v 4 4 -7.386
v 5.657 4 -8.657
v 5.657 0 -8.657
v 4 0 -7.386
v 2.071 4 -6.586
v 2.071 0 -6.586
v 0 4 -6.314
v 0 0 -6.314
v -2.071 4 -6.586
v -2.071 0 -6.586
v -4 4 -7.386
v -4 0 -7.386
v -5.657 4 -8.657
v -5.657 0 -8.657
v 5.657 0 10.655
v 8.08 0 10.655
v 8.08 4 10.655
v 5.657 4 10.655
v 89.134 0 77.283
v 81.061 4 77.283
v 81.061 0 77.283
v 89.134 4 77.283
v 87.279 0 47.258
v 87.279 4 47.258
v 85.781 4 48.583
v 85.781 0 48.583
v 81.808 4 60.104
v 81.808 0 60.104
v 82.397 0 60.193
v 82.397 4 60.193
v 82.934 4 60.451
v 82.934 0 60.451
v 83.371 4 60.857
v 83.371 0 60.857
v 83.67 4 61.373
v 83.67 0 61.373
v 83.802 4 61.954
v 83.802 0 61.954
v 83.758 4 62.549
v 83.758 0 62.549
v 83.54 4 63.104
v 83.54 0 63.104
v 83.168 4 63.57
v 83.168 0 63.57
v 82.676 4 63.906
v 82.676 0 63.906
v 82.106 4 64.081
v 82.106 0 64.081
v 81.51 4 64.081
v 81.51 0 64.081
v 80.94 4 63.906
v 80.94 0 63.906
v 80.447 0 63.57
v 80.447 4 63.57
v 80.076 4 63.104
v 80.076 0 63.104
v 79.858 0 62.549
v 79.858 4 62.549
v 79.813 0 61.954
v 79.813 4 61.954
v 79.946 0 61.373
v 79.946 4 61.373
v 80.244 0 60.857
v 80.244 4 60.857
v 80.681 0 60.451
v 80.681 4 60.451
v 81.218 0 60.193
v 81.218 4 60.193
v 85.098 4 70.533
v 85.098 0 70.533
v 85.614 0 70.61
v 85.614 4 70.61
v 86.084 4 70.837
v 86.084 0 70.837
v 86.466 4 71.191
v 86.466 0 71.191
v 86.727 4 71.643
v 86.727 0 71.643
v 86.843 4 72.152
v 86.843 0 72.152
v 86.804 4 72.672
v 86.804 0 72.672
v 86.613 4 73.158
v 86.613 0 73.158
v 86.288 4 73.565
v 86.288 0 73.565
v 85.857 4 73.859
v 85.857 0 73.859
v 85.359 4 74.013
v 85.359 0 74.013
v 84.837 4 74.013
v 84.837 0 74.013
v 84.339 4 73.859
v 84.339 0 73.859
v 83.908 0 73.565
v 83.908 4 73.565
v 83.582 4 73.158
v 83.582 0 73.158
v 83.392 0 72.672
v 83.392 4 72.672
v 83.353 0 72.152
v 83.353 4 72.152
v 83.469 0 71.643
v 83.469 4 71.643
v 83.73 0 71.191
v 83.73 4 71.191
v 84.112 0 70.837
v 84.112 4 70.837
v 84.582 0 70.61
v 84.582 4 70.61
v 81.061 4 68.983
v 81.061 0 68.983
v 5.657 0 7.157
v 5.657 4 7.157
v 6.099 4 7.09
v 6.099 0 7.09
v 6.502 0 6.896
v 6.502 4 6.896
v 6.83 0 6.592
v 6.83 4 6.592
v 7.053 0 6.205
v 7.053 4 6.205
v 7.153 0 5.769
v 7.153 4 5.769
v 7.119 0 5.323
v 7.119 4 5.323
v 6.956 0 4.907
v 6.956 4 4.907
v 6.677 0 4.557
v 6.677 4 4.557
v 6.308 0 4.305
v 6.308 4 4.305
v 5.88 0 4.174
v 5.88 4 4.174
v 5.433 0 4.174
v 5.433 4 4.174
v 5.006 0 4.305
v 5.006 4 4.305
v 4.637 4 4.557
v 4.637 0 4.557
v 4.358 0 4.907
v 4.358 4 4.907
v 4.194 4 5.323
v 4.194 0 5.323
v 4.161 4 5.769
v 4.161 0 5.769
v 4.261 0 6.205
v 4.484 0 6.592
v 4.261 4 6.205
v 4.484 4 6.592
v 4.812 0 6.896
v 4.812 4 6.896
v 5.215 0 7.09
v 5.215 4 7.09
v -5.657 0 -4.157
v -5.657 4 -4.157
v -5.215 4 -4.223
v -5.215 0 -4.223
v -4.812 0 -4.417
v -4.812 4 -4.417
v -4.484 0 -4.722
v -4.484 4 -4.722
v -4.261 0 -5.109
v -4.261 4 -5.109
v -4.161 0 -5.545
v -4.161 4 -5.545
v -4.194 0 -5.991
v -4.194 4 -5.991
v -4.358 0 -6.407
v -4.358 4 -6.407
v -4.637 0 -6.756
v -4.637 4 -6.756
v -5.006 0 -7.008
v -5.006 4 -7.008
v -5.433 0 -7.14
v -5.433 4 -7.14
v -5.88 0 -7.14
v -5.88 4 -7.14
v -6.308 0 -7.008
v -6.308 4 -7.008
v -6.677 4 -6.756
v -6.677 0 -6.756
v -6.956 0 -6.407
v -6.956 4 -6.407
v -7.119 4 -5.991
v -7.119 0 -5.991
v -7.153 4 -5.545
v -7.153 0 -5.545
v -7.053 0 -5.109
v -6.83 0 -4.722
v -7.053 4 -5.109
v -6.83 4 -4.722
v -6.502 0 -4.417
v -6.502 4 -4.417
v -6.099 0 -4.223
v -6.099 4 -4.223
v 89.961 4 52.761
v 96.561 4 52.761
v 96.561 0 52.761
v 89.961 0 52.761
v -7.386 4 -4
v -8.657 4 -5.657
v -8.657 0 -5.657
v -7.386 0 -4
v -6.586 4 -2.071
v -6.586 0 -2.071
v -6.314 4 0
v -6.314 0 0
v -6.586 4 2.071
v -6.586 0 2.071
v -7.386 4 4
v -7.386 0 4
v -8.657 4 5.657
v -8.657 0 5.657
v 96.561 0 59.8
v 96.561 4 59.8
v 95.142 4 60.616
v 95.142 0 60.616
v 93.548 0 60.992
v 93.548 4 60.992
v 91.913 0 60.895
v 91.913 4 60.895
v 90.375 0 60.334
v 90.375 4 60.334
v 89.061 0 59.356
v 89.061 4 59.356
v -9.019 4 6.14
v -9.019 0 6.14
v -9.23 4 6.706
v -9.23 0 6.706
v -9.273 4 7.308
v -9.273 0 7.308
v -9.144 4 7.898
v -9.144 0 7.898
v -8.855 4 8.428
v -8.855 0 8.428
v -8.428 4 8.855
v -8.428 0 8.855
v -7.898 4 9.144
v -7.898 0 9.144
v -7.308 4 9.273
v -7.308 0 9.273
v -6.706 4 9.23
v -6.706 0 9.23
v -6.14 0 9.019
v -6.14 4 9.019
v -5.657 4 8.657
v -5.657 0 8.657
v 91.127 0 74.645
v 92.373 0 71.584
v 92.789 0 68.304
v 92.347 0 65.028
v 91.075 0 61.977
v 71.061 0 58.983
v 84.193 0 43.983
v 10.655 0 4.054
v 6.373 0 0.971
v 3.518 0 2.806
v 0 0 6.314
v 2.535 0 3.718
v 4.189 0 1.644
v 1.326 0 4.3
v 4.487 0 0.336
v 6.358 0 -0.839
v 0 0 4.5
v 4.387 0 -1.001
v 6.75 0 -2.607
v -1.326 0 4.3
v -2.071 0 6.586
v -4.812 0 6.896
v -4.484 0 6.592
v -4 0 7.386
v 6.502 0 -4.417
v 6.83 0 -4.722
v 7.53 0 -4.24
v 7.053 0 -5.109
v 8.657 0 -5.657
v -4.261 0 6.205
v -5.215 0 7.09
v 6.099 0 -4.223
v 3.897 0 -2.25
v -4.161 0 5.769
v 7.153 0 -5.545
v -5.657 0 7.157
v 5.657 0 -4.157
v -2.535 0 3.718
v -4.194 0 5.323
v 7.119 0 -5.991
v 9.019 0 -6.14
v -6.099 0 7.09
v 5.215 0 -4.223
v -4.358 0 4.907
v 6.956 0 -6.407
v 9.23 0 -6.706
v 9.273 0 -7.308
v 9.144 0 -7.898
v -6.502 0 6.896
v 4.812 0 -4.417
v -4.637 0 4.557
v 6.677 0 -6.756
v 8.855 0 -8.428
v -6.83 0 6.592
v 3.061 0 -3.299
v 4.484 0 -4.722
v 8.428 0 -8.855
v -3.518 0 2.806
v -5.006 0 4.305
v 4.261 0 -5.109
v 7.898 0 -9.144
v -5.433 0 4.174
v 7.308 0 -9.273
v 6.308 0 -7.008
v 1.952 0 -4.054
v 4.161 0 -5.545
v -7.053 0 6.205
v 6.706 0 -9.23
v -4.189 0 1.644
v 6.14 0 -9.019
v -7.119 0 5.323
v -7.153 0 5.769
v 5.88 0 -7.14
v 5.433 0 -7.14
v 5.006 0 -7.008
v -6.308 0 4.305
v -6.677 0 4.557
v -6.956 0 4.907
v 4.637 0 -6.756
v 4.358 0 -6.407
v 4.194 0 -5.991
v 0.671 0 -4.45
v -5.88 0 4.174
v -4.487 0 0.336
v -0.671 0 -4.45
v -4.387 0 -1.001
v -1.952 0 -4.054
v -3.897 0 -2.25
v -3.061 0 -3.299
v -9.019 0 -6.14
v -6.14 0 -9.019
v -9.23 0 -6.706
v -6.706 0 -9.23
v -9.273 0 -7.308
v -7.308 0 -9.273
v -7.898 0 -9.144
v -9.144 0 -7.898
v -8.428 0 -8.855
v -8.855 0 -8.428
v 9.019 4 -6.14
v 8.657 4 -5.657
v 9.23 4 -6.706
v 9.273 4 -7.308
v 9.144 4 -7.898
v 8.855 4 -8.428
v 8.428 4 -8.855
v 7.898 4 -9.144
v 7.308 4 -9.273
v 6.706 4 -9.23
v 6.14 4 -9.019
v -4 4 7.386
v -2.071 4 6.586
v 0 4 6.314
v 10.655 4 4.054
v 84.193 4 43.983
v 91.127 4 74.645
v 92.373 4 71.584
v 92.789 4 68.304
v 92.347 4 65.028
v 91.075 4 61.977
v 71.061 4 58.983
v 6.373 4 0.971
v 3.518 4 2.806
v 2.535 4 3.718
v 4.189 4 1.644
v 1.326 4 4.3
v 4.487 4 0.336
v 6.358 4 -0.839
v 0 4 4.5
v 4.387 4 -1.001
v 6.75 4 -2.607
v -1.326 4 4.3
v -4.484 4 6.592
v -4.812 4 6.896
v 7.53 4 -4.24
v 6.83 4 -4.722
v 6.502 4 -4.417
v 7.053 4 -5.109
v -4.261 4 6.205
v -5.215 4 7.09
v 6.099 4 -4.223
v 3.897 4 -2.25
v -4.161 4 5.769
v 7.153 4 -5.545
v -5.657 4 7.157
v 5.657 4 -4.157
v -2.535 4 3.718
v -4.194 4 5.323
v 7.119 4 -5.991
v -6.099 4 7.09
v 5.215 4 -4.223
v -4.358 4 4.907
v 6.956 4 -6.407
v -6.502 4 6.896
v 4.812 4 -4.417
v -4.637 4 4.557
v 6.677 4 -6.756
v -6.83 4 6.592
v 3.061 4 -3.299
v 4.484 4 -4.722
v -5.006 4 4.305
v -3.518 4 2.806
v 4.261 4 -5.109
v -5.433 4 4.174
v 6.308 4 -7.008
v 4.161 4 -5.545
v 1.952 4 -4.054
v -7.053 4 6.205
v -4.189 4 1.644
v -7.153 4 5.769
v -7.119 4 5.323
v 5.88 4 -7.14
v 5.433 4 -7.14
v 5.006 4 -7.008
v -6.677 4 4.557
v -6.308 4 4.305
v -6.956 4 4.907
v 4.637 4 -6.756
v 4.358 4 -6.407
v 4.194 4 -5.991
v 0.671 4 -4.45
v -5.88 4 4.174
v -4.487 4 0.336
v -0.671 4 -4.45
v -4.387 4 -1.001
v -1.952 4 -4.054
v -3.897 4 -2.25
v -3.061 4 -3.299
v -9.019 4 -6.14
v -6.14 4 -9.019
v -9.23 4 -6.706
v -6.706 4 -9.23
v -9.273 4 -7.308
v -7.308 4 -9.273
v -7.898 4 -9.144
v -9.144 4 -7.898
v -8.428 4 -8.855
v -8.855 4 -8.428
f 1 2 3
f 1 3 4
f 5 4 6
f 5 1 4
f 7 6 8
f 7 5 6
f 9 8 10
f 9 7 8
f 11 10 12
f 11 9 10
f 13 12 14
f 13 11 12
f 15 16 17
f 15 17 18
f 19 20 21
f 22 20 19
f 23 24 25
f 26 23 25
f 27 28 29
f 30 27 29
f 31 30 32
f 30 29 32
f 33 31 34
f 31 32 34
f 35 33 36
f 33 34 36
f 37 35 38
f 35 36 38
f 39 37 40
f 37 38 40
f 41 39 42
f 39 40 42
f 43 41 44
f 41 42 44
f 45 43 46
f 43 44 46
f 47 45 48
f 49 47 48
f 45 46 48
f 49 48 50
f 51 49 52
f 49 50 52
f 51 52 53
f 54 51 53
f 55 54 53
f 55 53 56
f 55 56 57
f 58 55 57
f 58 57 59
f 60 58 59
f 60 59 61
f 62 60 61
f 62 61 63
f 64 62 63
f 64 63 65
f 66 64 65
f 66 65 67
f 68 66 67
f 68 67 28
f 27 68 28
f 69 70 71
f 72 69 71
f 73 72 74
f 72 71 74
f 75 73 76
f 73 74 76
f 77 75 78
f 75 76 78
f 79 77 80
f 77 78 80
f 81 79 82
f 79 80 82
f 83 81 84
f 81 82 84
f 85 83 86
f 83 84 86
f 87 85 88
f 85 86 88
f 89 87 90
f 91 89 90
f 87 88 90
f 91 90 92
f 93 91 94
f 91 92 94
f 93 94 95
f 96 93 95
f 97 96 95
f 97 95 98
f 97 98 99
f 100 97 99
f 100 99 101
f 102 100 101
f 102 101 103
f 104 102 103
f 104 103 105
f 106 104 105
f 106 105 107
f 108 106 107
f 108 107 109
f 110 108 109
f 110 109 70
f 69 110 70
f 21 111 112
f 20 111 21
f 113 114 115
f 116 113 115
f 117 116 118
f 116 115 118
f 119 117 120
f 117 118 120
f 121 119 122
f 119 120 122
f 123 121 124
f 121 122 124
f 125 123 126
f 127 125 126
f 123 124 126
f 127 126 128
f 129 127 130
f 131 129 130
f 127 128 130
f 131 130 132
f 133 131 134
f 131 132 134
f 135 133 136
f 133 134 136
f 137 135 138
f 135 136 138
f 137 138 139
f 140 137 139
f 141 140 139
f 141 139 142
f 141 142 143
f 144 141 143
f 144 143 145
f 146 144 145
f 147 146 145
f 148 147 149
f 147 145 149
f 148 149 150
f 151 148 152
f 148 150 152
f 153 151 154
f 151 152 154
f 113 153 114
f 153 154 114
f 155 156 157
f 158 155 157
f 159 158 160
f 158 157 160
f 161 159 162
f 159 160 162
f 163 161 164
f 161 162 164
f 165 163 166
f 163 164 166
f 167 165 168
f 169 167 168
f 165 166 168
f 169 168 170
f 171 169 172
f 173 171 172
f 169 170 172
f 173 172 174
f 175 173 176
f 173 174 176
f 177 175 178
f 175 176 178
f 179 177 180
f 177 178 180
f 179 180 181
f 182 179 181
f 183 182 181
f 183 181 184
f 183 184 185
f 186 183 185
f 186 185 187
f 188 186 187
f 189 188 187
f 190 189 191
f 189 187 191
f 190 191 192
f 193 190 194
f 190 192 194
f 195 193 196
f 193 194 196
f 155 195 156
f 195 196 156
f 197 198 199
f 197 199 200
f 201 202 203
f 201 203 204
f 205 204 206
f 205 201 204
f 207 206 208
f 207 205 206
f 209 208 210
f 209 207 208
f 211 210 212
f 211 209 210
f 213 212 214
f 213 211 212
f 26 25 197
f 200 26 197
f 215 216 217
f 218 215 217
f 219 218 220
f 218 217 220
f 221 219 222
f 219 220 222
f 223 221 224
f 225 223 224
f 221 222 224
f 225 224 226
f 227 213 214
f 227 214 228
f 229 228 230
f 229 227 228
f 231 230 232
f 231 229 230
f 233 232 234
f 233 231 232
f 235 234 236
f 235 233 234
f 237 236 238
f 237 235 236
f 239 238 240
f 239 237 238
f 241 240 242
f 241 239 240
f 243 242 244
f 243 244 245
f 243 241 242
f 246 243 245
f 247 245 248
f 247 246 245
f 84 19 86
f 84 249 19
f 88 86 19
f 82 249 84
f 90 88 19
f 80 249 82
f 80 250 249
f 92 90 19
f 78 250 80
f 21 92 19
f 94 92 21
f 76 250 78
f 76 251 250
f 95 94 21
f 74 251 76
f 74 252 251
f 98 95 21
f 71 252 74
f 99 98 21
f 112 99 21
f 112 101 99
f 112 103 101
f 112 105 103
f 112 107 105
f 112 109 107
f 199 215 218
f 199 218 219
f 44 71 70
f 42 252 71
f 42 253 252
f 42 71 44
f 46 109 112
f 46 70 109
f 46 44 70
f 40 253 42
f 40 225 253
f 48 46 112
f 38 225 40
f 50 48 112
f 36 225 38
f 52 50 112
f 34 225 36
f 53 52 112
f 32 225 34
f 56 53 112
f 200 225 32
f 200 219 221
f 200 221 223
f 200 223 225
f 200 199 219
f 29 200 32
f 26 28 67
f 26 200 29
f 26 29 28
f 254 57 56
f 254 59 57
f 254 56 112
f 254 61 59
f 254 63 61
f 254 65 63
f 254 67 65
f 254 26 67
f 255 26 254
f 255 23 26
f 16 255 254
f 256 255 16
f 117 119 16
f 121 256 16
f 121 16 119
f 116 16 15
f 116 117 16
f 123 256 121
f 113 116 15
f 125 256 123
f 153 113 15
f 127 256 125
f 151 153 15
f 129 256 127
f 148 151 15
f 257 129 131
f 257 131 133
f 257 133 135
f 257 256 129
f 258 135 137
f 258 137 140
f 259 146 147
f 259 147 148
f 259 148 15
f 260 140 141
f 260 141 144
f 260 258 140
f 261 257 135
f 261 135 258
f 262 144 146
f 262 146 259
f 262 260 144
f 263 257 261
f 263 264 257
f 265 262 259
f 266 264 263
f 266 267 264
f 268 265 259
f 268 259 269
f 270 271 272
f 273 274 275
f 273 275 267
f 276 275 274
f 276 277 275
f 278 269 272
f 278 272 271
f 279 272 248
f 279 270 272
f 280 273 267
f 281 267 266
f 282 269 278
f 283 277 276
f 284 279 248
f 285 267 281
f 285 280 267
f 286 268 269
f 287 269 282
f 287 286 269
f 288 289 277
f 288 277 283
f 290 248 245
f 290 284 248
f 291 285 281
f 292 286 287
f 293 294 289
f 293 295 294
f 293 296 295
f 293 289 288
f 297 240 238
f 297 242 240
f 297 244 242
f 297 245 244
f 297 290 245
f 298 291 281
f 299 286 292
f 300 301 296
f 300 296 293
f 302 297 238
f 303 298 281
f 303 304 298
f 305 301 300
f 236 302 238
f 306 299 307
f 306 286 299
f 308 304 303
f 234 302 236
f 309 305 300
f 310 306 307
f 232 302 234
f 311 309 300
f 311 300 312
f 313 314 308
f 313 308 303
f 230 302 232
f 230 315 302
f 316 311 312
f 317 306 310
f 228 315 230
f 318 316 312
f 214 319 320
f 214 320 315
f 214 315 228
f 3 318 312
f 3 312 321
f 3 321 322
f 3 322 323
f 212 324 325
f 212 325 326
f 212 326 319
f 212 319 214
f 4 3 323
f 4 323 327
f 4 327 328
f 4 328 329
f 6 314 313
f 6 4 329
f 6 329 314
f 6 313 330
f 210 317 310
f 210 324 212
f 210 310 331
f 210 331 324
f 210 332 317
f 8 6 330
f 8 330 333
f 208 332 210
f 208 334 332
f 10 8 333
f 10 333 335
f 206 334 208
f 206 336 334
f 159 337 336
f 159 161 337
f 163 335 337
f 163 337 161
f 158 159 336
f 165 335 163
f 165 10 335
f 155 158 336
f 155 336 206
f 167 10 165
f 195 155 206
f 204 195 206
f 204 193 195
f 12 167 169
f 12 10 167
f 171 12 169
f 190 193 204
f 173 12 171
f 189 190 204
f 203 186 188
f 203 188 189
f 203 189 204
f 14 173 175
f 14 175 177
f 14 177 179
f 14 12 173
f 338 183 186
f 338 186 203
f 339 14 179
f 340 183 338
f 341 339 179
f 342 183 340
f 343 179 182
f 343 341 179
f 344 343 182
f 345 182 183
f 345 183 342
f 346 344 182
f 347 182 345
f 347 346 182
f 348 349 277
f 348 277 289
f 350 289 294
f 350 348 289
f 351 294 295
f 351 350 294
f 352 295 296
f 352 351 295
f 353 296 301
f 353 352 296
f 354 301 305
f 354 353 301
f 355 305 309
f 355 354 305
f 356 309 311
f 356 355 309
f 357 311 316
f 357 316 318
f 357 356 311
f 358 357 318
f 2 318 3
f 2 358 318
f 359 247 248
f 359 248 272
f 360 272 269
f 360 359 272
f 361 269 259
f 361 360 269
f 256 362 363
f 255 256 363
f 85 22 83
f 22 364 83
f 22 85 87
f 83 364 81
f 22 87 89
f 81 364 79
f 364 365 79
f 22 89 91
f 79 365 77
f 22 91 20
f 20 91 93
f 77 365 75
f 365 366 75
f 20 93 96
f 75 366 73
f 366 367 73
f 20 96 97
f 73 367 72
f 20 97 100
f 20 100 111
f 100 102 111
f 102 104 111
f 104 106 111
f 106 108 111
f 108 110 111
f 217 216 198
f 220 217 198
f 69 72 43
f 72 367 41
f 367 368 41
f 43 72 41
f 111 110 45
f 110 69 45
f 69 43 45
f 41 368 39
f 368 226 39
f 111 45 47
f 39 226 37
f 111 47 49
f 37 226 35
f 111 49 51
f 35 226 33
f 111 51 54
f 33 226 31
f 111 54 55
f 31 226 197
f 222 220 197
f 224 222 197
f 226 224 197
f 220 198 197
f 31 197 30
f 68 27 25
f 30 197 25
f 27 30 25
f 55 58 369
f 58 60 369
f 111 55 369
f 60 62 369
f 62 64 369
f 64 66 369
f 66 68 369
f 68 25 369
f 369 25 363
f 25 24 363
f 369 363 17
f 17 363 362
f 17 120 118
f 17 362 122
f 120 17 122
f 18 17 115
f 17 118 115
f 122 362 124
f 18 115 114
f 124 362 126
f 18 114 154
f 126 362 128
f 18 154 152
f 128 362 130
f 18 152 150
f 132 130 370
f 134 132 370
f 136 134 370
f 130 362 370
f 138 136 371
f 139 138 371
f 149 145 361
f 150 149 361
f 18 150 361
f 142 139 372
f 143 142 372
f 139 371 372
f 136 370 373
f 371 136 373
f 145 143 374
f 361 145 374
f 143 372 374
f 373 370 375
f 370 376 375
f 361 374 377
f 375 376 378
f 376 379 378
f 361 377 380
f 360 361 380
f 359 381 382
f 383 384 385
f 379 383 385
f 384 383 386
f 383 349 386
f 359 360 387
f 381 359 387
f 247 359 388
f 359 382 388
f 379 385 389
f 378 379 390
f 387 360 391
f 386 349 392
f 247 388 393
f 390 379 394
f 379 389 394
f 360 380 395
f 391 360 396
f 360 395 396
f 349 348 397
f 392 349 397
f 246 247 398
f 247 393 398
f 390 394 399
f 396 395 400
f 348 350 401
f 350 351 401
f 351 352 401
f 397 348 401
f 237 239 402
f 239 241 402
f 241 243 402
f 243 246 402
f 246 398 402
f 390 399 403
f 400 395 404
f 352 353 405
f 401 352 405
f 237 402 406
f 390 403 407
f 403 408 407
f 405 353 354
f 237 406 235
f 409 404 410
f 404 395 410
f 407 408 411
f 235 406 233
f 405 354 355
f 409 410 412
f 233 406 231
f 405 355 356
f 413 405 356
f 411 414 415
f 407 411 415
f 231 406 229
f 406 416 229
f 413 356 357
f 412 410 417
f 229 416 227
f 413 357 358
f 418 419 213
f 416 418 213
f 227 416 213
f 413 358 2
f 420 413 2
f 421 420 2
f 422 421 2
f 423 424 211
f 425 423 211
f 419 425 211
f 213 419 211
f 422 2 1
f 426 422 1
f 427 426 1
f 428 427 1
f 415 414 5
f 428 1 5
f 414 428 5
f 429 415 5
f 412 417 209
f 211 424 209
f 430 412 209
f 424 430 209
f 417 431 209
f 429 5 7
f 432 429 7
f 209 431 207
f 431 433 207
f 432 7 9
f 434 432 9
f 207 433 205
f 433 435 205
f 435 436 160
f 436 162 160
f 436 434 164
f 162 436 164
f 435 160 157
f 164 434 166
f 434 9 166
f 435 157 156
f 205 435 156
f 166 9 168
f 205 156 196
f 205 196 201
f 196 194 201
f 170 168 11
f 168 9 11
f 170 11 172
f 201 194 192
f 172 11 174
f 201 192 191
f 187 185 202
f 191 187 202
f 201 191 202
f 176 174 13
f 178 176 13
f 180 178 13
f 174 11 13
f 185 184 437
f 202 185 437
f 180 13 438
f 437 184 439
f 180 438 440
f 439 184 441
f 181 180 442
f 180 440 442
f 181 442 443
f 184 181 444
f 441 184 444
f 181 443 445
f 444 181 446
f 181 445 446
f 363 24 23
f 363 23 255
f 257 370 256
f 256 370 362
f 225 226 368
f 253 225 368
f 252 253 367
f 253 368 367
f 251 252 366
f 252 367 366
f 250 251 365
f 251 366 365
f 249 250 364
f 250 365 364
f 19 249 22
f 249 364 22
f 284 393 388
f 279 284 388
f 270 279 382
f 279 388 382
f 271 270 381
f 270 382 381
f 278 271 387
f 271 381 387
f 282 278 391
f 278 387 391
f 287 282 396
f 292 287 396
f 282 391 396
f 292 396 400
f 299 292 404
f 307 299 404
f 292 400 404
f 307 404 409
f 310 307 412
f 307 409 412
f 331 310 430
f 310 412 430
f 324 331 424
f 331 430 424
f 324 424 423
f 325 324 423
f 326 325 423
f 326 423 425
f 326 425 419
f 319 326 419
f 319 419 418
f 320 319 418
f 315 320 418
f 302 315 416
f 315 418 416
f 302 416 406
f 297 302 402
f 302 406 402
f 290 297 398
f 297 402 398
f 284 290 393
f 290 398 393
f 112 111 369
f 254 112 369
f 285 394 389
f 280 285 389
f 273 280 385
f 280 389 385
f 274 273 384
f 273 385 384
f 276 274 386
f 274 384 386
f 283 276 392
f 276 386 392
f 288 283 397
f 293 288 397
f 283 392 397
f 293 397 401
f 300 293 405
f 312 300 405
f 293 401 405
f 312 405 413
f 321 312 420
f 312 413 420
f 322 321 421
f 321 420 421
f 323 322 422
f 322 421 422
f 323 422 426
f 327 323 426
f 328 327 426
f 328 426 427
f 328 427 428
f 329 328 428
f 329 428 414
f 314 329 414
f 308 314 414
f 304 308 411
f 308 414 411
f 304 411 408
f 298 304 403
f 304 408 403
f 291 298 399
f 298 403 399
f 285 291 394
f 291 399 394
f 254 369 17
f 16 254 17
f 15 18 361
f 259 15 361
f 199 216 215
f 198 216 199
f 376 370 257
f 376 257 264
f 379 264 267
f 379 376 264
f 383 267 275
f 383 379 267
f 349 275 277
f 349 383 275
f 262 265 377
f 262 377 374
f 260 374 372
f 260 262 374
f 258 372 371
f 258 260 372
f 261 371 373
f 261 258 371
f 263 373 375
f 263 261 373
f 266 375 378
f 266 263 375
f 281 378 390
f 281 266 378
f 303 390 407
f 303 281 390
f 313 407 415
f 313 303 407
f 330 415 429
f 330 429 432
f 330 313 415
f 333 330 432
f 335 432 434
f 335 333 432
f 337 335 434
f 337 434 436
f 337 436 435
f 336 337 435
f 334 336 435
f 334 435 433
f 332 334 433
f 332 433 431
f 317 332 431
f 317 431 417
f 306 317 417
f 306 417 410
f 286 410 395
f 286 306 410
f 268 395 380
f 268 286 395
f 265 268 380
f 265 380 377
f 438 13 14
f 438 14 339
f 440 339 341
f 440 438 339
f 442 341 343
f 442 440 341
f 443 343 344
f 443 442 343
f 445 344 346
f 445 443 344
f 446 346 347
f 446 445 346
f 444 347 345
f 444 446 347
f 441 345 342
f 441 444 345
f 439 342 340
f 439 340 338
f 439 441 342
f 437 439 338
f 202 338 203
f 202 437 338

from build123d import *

# Parameters (mm, degrees)
SKETCH1_W            = 16.31
SKETCH1_H            = 16.31
SKETCH1_R            = 4.5
BOSS_EXTRUDE1_DEPTH  = 4
SKETCH3_R            = 1.5
CUT_EXTRUDE1_DEPTH   = 4
BOSS_EXTRUDE2_DEPTH  = 4
BOSS_EXTRUDE6_DEPTH  = 4
CUT_EXTRUDE3_DEPTH   = 4
BOSS_EXTRUDE7_DEPTH  = 4
BOSS_EXTRUDE9_DEPTH  = 4
SKETCH17_OUTSIDE_W   = 136.165
SKETCH17_OUTSIDE_H   = 117.232
CUT_EXTRUDE4_DEPTH   = 4
SKETCH18_R           = 1.5
BOSS_EXTRUDE10_DEPTH = 4
CUT_EXTRUDE5_DEPTH   = 4
SKETCH20_R           = 2
CUT_EXTRUDE6_DEPTH   = 10
SKETCH22_R           = 1.75
CUT_EXTRUDE8_DEPTH   = 124.744497459


with BuildPart() as part:
    # Sketch1 → Boss-Extrude1 (new body)
    with BuildSketch(Plane(origin=(0, 0, 0), x_dir=(1, 0, 0), z_dir=(0, 1, 0))):
        Rectangle(SKETCH1_W, SKETCH1_H)
        with Locations(Location((0, 0, 0), (0, 0, 270))):
            Circle(SKETCH1_R, mode=Mode.SUBTRACT)
    extrude(amount=BOSS_EXTRUDE1_DEPTH)

    # Sketch3 → Cut-Extrude1 (cut)
    with BuildSketch(Plane(origin=(0, 4, 0), x_dir=(1, 0, 0), z_dir=(0, 1, 0))):
        with Locations(Location((5.656854249, 5.656854249, 0), (0, 0, 270))):
            Circle(SKETCH3_R)
        with Locations(Location((5.656854249, -5.656854249, 0), (0, 0, 270))):
            Circle(SKETCH3_R)
        with Locations(Location((-5.656854249, -5.656854249, 0), (0, 0, 270))):
            Circle(SKETCH3_R)
        with Locations(Location((-5.656854249, 5.656854249, 0), (0, 0, 270))):
            Circle(SKETCH3_R)
    extrude(amount=-CUT_EXTRUDE1_DEPTH, mode=Mode.SUBTRACT)

    # Sketch4 → Boss-Extrude2 (add)
    with BuildSketch(Plane(origin=(0, 4, 0), x_dir=(1, 0, 0), z_dir=(0, 1, 0))):
        Polygon((8.155, -8.155), (0, -8.155), (0, -10.655), (10.655, -10.655), (10.655, 0), (8.155, 0), align=None)
    extrude(amount=-BOSS_EXTRUDE2_DEPTH)

    # Sketch9 → Boss-Extrude6 (add)
    with BuildSketch(Plane(origin=(0, 4, 0), x_dir=(1, 0, 0), z_dir=(0, 1, 0))):
        Polygon((71.061407011, -58.982568069), (7.593139788, -10.281653748), (10.613791504, -4.032054751), (84.193483815, -43.982568069), (90.501950314, -50.291034568), (96.061407011, -50.291034568), (96.061407011, -73.982568069), (81.061407011, -73.982568069), (81.061407011, -68.982568069), align=None)
    extrude(amount=-BOSS_EXTRUDE6_DEPTH)

    # Sketch12 → Cut-Extrude3 (cut)
    with BuildSketch(Plane(origin=(0, 4, 0), x_dir=(1, 0, 0), z_dir=(0, 1, 0))):
        Polygon((87.278639473, -47.258318902), (85.780514725, -48.583317861), (89.960889469, -52.761034568), (90.501950314, -52.761034568), (96.061407011, -52.761034568), (96.061407011, -50.291034568), (90.501950314, -50.291034568), (87.347717064, -47.136801318), align=None)
    extrude(amount=-CUT_EXTRUDE3_DEPTH, mode=Mode.SUBTRACT)

    # Sketch13 → Boss-Extrude7 (add)
    with BuildSketch(Plane(origin=(0, 4, 0), x_dir=(1, 0, 0), z_dir=(0, 1, 0))):
        Polygon((81.061407011, -73.982568069), (81.061407011, -77.282568069), (96.561407011, -77.282568069), (96.561407011, -52.761034568), (96.061407011, -52.761034568), (96.061407011, -73.982568069), align=None)
    extrude(amount=-BOSS_EXTRUDE7_DEPTH)

    # Sketch16 → Boss-Extrude9 (add)
    with BuildSketch(Plane(origin=(0, 4, 0), x_dir=(1, 0, 0), z_dir=(0, 1, 0))):
        Polygon((0, -10.655), (-10, -10.655), (-10, 10.345), (10.655, 10.345), (10.655, 0), (8.155, 0), (8.155, 8.155), (-8.155, 8.155), (-8.155, -8.155), (0, -8.155), align=None)
    extrude(amount=-BOSS_EXTRUDE9_DEPTH)

    # Sketch17 outside → Cut-Extrude4 (cut)
    with BuildSketch(Plane(origin=(0, 4, 0), x_dir=(1, 0, 0), z_dir=(0, 1, 0))):
        with Locations((43.2805, -33.469)):
            Rectangle(SKETCH17_OUTSIDE_W, SKETCH17_OUTSIDE_H)
        with BuildLine():
            Line((5.656854249, -8.656854249), (5.656854249, -10.655))
            Line((5.656854249, -10.655), (8.079694096, -10.655))
            Line((8.079694096, -10.655), (71.061407011, -58.982568069))
            Line((71.061407011, -58.982568069), (81.061407011, -68.982568069))
            Line((81.061407011, -68.982568069), (81.061407011, -77.282568069))
            Line((81.061407011, -77.282568069), (96.561407011, -77.282568069))
            Line((96.561407011, -77.282568069), (96.561407011, -52.761034568))
            Line((96.561407011, -52.761034568), (89.960889469, -52.761034568))
            Line((89.960889469, -52.761034568), (85.780514725, -48.583317861))
            Line((85.780514725, -48.583317861), (87.278639473, -47.258318902))
            Line((87.278639473, -47.258318902), (84.193483815, -43.982568069))
            Line((84.193483815, -43.982568069), (10.655, -4.054429139))
            Line((10.655, -4.054429139), (8.656854249, -5.656854249))
            ThreePointArc((8.656854249, -5.656854249), (6.313708499, 0), (8.656854249, 5.656854249))
            ThreePointArc((8.656854249, 5.656854249), (8.656854249, 8.656854249), (5.656854249, 8.656854249))
            ThreePointArc((5.656854249, 8.656854249), (0, 6.313708499), (-5.656854249, 8.656854249))
            ThreePointArc((-5.656854249, 8.656854249), (-8.656854249, 8.656854249), (-8.656854249, 5.656854249))
            ThreePointArc((-8.656854249, 5.656854249), (-6.313708499, 0), (-8.656854249, -5.656854249))
            ThreePointArc((-8.656854249, -5.656854249), (-8.656854249, -8.656854249), (-5.656854249, -8.656854249))
            ThreePointArc((-5.656854249, -8.656854249), (0, -6.313708499), (5.656854249, -8.656854249))
        make_face(mode=Mode.SUBTRACT)
    extrude(amount=-CUT_EXTRUDE4_DEPTH, mode=Mode.SUBTRACT)

    # Sketch18 → Boss-Extrude10 (add)
    with BuildSketch(Plane(origin=(0, 4, 0), x_dir=(1, 0, 0), z_dir=(0, 1, 0))):
        Polygon((5.656854249, -10.655), (0, -6.313708499), (6.372805828, -0.97060021), (10.655, -4.054429139), (8.656854249, -5.656854249), align=None)
        with Locations(Location((5.656854249, -5.656854249, 0), (0, 0, 270))):
            Circle(SKETCH18_R, mode=Mode.SUBTRACT)
    extrude(amount=-BOSS_EXTRUDE10_DEPTH)

    # Sketch19 → Cut-Extrude5 (cut)
    with BuildSketch(Plane(origin=(0, 4, 0), x_dir=(1, 0, 0), z_dir=(0, 1, 0))):
        with BuildLine():
            Line((97.061407011, -77.355955856), (97.061407011, -59.355955856))
            ThreePointArc((97.061407011, -59.355955856), (93.061407011, -61.012810105), (89.061407011, -59.355955856))
            ThreePointArc((89.061407011, -59.355955856), (92.789329073, -68.355955856), (89.061407011, -77.355955856))
            Line((89.061407011, -77.355955856), (97.061407011, -77.355955856))
        make_face()
    extrude(amount=-CUT_EXTRUDE5_DEPTH, mode=Mode.SUBTRACT)

    # Sketch20 → Cut-Extrude6 (cut)
    with BuildSketch(Plane.XZ):
        with Locations(Location((81.807805677, 62.103797793, 0), (0, 0, 270))):
            Circle(SKETCH20_R)
    extrude(amount=-CUT_EXTRUDE6_DEPTH, mode=Mode.SUBTRACT)

    # Sketch22 → Cut-Extrude8 (cut, through all)
    with BuildSketch(Plane.XZ):
        with Locations(Location((85.097804106, 72.282568069, 0), (0, 0, 270))):
            Circle(SKETCH22_R)
    extrude(amount=-CUT_EXTRUDE8_DEPTH, mode=Mode.SUBTRACT)


solid = part.part
